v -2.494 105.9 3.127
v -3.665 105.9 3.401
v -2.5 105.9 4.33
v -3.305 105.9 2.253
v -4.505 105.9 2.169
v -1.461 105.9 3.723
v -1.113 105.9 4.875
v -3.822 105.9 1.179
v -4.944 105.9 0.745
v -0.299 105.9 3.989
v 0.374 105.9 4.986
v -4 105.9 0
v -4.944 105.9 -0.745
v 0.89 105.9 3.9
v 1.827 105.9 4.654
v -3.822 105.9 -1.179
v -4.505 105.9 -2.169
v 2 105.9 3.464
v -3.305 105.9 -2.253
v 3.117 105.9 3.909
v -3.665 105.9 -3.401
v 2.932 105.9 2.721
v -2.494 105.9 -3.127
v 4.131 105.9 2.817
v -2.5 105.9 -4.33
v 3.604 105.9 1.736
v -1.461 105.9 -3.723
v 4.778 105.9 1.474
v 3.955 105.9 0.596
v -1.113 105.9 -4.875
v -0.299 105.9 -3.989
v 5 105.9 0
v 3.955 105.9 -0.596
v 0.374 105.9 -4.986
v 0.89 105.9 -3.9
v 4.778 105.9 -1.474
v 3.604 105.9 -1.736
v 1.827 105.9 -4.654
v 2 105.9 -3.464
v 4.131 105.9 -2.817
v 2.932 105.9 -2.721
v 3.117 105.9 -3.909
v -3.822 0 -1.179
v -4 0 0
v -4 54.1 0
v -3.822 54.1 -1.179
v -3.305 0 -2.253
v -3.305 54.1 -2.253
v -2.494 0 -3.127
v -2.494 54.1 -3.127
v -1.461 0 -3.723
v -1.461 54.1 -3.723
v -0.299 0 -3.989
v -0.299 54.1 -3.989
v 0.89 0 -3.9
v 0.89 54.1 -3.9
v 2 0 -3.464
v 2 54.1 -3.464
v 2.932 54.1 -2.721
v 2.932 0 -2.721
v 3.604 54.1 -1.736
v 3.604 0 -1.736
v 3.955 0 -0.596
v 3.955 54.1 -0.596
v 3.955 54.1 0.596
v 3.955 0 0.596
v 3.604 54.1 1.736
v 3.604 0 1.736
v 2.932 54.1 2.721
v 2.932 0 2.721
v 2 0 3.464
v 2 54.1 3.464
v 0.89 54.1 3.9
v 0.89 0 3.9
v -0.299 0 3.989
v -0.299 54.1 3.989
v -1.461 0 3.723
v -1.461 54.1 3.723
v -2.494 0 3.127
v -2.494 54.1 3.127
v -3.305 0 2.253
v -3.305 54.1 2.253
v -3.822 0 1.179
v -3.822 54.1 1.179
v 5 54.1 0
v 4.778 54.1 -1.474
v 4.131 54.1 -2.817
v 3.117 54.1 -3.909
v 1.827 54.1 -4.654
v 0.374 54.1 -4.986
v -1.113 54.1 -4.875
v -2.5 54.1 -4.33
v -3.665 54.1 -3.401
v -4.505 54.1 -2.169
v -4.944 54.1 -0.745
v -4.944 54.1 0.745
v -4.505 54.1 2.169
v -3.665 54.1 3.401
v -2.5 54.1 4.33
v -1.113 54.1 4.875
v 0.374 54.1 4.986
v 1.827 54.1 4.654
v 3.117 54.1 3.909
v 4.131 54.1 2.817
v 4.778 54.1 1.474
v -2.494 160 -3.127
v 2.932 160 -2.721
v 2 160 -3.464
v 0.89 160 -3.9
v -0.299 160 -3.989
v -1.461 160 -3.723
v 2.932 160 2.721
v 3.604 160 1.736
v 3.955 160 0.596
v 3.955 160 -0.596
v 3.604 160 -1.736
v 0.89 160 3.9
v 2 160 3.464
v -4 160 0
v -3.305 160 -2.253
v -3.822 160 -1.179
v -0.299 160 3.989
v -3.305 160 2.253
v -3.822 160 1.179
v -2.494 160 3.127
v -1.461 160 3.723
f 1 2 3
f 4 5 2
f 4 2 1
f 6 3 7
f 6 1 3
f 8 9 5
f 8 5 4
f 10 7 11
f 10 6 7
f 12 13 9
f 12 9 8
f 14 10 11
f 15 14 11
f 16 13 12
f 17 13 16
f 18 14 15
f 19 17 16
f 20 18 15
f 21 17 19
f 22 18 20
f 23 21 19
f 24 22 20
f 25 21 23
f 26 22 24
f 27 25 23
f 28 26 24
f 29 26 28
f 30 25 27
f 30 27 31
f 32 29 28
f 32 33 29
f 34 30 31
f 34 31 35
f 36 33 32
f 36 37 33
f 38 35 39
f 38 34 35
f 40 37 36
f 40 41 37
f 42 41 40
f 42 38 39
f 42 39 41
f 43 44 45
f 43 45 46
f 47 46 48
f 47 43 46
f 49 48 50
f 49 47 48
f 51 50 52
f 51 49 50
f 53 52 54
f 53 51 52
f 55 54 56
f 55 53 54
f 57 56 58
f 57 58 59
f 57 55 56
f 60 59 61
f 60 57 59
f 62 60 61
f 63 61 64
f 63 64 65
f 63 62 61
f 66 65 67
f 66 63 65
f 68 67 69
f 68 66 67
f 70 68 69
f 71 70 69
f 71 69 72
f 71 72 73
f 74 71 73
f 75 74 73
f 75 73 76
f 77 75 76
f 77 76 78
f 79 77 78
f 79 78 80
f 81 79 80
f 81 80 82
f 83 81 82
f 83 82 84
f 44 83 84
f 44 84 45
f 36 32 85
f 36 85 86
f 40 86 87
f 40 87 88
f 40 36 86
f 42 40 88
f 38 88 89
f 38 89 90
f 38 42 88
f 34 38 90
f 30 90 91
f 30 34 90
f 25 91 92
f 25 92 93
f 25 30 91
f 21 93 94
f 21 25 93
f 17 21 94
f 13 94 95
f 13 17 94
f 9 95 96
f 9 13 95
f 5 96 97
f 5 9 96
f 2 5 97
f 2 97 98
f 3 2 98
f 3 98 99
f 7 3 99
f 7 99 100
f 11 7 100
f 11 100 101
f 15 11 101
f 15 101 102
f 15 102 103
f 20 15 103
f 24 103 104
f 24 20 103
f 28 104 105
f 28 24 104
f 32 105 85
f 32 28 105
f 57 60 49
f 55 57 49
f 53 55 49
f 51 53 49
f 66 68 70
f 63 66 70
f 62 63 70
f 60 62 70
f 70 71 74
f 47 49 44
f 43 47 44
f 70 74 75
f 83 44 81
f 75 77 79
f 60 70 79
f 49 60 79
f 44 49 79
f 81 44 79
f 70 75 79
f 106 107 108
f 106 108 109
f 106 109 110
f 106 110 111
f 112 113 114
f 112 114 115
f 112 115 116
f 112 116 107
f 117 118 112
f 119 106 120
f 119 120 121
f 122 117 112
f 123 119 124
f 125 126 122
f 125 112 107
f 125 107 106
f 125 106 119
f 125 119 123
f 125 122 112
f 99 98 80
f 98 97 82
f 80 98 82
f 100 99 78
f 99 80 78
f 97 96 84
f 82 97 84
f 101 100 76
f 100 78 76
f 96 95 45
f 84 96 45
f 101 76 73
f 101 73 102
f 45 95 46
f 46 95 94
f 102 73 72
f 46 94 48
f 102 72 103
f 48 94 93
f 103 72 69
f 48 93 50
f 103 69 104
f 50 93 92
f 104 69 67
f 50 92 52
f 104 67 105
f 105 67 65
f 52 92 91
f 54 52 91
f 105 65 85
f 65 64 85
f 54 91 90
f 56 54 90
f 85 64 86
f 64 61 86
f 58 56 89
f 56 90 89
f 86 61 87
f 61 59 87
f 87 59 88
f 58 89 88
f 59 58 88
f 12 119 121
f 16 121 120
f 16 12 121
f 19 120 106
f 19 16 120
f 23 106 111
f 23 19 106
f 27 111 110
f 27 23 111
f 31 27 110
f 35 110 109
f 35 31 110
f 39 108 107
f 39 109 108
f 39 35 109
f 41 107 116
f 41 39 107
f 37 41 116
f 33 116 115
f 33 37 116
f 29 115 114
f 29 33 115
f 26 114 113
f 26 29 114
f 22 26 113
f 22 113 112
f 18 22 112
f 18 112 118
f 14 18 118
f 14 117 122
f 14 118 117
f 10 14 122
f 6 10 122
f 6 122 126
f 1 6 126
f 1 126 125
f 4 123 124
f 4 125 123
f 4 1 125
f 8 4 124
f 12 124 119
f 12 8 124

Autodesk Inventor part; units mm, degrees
ref_plane "YZ Plane" through (0, 0, 0) normal (1, 0, 0) x (0, 1, 0)
ref_plane "XZ Plane" through (0, 0, 0) normal (0, 1, 0) x (-1, 0, 0)
sketch "スケッチ1" plane through (0, 0, 0) normal (0, 1, 0) x (-1, 0, 0)
  circle A0 centre (0, 0) radius 4
  dimension "d0" = 8
extrude "押し出し1" add sketch "スケッチ1" along normal blind 160
ref_plane "作業平面1" through (0, 80, 0) normal (0, 1, 0) x (1, 0, 0)
sketch "スケッチ2" plane through (0, 80, 0) normal (0, 1, 0) x (1, 0, 0)
  circle A0 centre (0, 0) radius 4 projected
  circle A1 centre (0, 0) radius 5
  dimension "d3" = 10
extrude "押し出し2" add sketch "スケッチ2" along normal blind 25.9 and the other way blind 25.9 contours A0 | A1
sketch "スケッチ3" plane through (0, 80, 0) normal (0, 1, 0) x (1, 0, 0)
  point P0 (0, 0)
properties part number "elbow_shaft2"
